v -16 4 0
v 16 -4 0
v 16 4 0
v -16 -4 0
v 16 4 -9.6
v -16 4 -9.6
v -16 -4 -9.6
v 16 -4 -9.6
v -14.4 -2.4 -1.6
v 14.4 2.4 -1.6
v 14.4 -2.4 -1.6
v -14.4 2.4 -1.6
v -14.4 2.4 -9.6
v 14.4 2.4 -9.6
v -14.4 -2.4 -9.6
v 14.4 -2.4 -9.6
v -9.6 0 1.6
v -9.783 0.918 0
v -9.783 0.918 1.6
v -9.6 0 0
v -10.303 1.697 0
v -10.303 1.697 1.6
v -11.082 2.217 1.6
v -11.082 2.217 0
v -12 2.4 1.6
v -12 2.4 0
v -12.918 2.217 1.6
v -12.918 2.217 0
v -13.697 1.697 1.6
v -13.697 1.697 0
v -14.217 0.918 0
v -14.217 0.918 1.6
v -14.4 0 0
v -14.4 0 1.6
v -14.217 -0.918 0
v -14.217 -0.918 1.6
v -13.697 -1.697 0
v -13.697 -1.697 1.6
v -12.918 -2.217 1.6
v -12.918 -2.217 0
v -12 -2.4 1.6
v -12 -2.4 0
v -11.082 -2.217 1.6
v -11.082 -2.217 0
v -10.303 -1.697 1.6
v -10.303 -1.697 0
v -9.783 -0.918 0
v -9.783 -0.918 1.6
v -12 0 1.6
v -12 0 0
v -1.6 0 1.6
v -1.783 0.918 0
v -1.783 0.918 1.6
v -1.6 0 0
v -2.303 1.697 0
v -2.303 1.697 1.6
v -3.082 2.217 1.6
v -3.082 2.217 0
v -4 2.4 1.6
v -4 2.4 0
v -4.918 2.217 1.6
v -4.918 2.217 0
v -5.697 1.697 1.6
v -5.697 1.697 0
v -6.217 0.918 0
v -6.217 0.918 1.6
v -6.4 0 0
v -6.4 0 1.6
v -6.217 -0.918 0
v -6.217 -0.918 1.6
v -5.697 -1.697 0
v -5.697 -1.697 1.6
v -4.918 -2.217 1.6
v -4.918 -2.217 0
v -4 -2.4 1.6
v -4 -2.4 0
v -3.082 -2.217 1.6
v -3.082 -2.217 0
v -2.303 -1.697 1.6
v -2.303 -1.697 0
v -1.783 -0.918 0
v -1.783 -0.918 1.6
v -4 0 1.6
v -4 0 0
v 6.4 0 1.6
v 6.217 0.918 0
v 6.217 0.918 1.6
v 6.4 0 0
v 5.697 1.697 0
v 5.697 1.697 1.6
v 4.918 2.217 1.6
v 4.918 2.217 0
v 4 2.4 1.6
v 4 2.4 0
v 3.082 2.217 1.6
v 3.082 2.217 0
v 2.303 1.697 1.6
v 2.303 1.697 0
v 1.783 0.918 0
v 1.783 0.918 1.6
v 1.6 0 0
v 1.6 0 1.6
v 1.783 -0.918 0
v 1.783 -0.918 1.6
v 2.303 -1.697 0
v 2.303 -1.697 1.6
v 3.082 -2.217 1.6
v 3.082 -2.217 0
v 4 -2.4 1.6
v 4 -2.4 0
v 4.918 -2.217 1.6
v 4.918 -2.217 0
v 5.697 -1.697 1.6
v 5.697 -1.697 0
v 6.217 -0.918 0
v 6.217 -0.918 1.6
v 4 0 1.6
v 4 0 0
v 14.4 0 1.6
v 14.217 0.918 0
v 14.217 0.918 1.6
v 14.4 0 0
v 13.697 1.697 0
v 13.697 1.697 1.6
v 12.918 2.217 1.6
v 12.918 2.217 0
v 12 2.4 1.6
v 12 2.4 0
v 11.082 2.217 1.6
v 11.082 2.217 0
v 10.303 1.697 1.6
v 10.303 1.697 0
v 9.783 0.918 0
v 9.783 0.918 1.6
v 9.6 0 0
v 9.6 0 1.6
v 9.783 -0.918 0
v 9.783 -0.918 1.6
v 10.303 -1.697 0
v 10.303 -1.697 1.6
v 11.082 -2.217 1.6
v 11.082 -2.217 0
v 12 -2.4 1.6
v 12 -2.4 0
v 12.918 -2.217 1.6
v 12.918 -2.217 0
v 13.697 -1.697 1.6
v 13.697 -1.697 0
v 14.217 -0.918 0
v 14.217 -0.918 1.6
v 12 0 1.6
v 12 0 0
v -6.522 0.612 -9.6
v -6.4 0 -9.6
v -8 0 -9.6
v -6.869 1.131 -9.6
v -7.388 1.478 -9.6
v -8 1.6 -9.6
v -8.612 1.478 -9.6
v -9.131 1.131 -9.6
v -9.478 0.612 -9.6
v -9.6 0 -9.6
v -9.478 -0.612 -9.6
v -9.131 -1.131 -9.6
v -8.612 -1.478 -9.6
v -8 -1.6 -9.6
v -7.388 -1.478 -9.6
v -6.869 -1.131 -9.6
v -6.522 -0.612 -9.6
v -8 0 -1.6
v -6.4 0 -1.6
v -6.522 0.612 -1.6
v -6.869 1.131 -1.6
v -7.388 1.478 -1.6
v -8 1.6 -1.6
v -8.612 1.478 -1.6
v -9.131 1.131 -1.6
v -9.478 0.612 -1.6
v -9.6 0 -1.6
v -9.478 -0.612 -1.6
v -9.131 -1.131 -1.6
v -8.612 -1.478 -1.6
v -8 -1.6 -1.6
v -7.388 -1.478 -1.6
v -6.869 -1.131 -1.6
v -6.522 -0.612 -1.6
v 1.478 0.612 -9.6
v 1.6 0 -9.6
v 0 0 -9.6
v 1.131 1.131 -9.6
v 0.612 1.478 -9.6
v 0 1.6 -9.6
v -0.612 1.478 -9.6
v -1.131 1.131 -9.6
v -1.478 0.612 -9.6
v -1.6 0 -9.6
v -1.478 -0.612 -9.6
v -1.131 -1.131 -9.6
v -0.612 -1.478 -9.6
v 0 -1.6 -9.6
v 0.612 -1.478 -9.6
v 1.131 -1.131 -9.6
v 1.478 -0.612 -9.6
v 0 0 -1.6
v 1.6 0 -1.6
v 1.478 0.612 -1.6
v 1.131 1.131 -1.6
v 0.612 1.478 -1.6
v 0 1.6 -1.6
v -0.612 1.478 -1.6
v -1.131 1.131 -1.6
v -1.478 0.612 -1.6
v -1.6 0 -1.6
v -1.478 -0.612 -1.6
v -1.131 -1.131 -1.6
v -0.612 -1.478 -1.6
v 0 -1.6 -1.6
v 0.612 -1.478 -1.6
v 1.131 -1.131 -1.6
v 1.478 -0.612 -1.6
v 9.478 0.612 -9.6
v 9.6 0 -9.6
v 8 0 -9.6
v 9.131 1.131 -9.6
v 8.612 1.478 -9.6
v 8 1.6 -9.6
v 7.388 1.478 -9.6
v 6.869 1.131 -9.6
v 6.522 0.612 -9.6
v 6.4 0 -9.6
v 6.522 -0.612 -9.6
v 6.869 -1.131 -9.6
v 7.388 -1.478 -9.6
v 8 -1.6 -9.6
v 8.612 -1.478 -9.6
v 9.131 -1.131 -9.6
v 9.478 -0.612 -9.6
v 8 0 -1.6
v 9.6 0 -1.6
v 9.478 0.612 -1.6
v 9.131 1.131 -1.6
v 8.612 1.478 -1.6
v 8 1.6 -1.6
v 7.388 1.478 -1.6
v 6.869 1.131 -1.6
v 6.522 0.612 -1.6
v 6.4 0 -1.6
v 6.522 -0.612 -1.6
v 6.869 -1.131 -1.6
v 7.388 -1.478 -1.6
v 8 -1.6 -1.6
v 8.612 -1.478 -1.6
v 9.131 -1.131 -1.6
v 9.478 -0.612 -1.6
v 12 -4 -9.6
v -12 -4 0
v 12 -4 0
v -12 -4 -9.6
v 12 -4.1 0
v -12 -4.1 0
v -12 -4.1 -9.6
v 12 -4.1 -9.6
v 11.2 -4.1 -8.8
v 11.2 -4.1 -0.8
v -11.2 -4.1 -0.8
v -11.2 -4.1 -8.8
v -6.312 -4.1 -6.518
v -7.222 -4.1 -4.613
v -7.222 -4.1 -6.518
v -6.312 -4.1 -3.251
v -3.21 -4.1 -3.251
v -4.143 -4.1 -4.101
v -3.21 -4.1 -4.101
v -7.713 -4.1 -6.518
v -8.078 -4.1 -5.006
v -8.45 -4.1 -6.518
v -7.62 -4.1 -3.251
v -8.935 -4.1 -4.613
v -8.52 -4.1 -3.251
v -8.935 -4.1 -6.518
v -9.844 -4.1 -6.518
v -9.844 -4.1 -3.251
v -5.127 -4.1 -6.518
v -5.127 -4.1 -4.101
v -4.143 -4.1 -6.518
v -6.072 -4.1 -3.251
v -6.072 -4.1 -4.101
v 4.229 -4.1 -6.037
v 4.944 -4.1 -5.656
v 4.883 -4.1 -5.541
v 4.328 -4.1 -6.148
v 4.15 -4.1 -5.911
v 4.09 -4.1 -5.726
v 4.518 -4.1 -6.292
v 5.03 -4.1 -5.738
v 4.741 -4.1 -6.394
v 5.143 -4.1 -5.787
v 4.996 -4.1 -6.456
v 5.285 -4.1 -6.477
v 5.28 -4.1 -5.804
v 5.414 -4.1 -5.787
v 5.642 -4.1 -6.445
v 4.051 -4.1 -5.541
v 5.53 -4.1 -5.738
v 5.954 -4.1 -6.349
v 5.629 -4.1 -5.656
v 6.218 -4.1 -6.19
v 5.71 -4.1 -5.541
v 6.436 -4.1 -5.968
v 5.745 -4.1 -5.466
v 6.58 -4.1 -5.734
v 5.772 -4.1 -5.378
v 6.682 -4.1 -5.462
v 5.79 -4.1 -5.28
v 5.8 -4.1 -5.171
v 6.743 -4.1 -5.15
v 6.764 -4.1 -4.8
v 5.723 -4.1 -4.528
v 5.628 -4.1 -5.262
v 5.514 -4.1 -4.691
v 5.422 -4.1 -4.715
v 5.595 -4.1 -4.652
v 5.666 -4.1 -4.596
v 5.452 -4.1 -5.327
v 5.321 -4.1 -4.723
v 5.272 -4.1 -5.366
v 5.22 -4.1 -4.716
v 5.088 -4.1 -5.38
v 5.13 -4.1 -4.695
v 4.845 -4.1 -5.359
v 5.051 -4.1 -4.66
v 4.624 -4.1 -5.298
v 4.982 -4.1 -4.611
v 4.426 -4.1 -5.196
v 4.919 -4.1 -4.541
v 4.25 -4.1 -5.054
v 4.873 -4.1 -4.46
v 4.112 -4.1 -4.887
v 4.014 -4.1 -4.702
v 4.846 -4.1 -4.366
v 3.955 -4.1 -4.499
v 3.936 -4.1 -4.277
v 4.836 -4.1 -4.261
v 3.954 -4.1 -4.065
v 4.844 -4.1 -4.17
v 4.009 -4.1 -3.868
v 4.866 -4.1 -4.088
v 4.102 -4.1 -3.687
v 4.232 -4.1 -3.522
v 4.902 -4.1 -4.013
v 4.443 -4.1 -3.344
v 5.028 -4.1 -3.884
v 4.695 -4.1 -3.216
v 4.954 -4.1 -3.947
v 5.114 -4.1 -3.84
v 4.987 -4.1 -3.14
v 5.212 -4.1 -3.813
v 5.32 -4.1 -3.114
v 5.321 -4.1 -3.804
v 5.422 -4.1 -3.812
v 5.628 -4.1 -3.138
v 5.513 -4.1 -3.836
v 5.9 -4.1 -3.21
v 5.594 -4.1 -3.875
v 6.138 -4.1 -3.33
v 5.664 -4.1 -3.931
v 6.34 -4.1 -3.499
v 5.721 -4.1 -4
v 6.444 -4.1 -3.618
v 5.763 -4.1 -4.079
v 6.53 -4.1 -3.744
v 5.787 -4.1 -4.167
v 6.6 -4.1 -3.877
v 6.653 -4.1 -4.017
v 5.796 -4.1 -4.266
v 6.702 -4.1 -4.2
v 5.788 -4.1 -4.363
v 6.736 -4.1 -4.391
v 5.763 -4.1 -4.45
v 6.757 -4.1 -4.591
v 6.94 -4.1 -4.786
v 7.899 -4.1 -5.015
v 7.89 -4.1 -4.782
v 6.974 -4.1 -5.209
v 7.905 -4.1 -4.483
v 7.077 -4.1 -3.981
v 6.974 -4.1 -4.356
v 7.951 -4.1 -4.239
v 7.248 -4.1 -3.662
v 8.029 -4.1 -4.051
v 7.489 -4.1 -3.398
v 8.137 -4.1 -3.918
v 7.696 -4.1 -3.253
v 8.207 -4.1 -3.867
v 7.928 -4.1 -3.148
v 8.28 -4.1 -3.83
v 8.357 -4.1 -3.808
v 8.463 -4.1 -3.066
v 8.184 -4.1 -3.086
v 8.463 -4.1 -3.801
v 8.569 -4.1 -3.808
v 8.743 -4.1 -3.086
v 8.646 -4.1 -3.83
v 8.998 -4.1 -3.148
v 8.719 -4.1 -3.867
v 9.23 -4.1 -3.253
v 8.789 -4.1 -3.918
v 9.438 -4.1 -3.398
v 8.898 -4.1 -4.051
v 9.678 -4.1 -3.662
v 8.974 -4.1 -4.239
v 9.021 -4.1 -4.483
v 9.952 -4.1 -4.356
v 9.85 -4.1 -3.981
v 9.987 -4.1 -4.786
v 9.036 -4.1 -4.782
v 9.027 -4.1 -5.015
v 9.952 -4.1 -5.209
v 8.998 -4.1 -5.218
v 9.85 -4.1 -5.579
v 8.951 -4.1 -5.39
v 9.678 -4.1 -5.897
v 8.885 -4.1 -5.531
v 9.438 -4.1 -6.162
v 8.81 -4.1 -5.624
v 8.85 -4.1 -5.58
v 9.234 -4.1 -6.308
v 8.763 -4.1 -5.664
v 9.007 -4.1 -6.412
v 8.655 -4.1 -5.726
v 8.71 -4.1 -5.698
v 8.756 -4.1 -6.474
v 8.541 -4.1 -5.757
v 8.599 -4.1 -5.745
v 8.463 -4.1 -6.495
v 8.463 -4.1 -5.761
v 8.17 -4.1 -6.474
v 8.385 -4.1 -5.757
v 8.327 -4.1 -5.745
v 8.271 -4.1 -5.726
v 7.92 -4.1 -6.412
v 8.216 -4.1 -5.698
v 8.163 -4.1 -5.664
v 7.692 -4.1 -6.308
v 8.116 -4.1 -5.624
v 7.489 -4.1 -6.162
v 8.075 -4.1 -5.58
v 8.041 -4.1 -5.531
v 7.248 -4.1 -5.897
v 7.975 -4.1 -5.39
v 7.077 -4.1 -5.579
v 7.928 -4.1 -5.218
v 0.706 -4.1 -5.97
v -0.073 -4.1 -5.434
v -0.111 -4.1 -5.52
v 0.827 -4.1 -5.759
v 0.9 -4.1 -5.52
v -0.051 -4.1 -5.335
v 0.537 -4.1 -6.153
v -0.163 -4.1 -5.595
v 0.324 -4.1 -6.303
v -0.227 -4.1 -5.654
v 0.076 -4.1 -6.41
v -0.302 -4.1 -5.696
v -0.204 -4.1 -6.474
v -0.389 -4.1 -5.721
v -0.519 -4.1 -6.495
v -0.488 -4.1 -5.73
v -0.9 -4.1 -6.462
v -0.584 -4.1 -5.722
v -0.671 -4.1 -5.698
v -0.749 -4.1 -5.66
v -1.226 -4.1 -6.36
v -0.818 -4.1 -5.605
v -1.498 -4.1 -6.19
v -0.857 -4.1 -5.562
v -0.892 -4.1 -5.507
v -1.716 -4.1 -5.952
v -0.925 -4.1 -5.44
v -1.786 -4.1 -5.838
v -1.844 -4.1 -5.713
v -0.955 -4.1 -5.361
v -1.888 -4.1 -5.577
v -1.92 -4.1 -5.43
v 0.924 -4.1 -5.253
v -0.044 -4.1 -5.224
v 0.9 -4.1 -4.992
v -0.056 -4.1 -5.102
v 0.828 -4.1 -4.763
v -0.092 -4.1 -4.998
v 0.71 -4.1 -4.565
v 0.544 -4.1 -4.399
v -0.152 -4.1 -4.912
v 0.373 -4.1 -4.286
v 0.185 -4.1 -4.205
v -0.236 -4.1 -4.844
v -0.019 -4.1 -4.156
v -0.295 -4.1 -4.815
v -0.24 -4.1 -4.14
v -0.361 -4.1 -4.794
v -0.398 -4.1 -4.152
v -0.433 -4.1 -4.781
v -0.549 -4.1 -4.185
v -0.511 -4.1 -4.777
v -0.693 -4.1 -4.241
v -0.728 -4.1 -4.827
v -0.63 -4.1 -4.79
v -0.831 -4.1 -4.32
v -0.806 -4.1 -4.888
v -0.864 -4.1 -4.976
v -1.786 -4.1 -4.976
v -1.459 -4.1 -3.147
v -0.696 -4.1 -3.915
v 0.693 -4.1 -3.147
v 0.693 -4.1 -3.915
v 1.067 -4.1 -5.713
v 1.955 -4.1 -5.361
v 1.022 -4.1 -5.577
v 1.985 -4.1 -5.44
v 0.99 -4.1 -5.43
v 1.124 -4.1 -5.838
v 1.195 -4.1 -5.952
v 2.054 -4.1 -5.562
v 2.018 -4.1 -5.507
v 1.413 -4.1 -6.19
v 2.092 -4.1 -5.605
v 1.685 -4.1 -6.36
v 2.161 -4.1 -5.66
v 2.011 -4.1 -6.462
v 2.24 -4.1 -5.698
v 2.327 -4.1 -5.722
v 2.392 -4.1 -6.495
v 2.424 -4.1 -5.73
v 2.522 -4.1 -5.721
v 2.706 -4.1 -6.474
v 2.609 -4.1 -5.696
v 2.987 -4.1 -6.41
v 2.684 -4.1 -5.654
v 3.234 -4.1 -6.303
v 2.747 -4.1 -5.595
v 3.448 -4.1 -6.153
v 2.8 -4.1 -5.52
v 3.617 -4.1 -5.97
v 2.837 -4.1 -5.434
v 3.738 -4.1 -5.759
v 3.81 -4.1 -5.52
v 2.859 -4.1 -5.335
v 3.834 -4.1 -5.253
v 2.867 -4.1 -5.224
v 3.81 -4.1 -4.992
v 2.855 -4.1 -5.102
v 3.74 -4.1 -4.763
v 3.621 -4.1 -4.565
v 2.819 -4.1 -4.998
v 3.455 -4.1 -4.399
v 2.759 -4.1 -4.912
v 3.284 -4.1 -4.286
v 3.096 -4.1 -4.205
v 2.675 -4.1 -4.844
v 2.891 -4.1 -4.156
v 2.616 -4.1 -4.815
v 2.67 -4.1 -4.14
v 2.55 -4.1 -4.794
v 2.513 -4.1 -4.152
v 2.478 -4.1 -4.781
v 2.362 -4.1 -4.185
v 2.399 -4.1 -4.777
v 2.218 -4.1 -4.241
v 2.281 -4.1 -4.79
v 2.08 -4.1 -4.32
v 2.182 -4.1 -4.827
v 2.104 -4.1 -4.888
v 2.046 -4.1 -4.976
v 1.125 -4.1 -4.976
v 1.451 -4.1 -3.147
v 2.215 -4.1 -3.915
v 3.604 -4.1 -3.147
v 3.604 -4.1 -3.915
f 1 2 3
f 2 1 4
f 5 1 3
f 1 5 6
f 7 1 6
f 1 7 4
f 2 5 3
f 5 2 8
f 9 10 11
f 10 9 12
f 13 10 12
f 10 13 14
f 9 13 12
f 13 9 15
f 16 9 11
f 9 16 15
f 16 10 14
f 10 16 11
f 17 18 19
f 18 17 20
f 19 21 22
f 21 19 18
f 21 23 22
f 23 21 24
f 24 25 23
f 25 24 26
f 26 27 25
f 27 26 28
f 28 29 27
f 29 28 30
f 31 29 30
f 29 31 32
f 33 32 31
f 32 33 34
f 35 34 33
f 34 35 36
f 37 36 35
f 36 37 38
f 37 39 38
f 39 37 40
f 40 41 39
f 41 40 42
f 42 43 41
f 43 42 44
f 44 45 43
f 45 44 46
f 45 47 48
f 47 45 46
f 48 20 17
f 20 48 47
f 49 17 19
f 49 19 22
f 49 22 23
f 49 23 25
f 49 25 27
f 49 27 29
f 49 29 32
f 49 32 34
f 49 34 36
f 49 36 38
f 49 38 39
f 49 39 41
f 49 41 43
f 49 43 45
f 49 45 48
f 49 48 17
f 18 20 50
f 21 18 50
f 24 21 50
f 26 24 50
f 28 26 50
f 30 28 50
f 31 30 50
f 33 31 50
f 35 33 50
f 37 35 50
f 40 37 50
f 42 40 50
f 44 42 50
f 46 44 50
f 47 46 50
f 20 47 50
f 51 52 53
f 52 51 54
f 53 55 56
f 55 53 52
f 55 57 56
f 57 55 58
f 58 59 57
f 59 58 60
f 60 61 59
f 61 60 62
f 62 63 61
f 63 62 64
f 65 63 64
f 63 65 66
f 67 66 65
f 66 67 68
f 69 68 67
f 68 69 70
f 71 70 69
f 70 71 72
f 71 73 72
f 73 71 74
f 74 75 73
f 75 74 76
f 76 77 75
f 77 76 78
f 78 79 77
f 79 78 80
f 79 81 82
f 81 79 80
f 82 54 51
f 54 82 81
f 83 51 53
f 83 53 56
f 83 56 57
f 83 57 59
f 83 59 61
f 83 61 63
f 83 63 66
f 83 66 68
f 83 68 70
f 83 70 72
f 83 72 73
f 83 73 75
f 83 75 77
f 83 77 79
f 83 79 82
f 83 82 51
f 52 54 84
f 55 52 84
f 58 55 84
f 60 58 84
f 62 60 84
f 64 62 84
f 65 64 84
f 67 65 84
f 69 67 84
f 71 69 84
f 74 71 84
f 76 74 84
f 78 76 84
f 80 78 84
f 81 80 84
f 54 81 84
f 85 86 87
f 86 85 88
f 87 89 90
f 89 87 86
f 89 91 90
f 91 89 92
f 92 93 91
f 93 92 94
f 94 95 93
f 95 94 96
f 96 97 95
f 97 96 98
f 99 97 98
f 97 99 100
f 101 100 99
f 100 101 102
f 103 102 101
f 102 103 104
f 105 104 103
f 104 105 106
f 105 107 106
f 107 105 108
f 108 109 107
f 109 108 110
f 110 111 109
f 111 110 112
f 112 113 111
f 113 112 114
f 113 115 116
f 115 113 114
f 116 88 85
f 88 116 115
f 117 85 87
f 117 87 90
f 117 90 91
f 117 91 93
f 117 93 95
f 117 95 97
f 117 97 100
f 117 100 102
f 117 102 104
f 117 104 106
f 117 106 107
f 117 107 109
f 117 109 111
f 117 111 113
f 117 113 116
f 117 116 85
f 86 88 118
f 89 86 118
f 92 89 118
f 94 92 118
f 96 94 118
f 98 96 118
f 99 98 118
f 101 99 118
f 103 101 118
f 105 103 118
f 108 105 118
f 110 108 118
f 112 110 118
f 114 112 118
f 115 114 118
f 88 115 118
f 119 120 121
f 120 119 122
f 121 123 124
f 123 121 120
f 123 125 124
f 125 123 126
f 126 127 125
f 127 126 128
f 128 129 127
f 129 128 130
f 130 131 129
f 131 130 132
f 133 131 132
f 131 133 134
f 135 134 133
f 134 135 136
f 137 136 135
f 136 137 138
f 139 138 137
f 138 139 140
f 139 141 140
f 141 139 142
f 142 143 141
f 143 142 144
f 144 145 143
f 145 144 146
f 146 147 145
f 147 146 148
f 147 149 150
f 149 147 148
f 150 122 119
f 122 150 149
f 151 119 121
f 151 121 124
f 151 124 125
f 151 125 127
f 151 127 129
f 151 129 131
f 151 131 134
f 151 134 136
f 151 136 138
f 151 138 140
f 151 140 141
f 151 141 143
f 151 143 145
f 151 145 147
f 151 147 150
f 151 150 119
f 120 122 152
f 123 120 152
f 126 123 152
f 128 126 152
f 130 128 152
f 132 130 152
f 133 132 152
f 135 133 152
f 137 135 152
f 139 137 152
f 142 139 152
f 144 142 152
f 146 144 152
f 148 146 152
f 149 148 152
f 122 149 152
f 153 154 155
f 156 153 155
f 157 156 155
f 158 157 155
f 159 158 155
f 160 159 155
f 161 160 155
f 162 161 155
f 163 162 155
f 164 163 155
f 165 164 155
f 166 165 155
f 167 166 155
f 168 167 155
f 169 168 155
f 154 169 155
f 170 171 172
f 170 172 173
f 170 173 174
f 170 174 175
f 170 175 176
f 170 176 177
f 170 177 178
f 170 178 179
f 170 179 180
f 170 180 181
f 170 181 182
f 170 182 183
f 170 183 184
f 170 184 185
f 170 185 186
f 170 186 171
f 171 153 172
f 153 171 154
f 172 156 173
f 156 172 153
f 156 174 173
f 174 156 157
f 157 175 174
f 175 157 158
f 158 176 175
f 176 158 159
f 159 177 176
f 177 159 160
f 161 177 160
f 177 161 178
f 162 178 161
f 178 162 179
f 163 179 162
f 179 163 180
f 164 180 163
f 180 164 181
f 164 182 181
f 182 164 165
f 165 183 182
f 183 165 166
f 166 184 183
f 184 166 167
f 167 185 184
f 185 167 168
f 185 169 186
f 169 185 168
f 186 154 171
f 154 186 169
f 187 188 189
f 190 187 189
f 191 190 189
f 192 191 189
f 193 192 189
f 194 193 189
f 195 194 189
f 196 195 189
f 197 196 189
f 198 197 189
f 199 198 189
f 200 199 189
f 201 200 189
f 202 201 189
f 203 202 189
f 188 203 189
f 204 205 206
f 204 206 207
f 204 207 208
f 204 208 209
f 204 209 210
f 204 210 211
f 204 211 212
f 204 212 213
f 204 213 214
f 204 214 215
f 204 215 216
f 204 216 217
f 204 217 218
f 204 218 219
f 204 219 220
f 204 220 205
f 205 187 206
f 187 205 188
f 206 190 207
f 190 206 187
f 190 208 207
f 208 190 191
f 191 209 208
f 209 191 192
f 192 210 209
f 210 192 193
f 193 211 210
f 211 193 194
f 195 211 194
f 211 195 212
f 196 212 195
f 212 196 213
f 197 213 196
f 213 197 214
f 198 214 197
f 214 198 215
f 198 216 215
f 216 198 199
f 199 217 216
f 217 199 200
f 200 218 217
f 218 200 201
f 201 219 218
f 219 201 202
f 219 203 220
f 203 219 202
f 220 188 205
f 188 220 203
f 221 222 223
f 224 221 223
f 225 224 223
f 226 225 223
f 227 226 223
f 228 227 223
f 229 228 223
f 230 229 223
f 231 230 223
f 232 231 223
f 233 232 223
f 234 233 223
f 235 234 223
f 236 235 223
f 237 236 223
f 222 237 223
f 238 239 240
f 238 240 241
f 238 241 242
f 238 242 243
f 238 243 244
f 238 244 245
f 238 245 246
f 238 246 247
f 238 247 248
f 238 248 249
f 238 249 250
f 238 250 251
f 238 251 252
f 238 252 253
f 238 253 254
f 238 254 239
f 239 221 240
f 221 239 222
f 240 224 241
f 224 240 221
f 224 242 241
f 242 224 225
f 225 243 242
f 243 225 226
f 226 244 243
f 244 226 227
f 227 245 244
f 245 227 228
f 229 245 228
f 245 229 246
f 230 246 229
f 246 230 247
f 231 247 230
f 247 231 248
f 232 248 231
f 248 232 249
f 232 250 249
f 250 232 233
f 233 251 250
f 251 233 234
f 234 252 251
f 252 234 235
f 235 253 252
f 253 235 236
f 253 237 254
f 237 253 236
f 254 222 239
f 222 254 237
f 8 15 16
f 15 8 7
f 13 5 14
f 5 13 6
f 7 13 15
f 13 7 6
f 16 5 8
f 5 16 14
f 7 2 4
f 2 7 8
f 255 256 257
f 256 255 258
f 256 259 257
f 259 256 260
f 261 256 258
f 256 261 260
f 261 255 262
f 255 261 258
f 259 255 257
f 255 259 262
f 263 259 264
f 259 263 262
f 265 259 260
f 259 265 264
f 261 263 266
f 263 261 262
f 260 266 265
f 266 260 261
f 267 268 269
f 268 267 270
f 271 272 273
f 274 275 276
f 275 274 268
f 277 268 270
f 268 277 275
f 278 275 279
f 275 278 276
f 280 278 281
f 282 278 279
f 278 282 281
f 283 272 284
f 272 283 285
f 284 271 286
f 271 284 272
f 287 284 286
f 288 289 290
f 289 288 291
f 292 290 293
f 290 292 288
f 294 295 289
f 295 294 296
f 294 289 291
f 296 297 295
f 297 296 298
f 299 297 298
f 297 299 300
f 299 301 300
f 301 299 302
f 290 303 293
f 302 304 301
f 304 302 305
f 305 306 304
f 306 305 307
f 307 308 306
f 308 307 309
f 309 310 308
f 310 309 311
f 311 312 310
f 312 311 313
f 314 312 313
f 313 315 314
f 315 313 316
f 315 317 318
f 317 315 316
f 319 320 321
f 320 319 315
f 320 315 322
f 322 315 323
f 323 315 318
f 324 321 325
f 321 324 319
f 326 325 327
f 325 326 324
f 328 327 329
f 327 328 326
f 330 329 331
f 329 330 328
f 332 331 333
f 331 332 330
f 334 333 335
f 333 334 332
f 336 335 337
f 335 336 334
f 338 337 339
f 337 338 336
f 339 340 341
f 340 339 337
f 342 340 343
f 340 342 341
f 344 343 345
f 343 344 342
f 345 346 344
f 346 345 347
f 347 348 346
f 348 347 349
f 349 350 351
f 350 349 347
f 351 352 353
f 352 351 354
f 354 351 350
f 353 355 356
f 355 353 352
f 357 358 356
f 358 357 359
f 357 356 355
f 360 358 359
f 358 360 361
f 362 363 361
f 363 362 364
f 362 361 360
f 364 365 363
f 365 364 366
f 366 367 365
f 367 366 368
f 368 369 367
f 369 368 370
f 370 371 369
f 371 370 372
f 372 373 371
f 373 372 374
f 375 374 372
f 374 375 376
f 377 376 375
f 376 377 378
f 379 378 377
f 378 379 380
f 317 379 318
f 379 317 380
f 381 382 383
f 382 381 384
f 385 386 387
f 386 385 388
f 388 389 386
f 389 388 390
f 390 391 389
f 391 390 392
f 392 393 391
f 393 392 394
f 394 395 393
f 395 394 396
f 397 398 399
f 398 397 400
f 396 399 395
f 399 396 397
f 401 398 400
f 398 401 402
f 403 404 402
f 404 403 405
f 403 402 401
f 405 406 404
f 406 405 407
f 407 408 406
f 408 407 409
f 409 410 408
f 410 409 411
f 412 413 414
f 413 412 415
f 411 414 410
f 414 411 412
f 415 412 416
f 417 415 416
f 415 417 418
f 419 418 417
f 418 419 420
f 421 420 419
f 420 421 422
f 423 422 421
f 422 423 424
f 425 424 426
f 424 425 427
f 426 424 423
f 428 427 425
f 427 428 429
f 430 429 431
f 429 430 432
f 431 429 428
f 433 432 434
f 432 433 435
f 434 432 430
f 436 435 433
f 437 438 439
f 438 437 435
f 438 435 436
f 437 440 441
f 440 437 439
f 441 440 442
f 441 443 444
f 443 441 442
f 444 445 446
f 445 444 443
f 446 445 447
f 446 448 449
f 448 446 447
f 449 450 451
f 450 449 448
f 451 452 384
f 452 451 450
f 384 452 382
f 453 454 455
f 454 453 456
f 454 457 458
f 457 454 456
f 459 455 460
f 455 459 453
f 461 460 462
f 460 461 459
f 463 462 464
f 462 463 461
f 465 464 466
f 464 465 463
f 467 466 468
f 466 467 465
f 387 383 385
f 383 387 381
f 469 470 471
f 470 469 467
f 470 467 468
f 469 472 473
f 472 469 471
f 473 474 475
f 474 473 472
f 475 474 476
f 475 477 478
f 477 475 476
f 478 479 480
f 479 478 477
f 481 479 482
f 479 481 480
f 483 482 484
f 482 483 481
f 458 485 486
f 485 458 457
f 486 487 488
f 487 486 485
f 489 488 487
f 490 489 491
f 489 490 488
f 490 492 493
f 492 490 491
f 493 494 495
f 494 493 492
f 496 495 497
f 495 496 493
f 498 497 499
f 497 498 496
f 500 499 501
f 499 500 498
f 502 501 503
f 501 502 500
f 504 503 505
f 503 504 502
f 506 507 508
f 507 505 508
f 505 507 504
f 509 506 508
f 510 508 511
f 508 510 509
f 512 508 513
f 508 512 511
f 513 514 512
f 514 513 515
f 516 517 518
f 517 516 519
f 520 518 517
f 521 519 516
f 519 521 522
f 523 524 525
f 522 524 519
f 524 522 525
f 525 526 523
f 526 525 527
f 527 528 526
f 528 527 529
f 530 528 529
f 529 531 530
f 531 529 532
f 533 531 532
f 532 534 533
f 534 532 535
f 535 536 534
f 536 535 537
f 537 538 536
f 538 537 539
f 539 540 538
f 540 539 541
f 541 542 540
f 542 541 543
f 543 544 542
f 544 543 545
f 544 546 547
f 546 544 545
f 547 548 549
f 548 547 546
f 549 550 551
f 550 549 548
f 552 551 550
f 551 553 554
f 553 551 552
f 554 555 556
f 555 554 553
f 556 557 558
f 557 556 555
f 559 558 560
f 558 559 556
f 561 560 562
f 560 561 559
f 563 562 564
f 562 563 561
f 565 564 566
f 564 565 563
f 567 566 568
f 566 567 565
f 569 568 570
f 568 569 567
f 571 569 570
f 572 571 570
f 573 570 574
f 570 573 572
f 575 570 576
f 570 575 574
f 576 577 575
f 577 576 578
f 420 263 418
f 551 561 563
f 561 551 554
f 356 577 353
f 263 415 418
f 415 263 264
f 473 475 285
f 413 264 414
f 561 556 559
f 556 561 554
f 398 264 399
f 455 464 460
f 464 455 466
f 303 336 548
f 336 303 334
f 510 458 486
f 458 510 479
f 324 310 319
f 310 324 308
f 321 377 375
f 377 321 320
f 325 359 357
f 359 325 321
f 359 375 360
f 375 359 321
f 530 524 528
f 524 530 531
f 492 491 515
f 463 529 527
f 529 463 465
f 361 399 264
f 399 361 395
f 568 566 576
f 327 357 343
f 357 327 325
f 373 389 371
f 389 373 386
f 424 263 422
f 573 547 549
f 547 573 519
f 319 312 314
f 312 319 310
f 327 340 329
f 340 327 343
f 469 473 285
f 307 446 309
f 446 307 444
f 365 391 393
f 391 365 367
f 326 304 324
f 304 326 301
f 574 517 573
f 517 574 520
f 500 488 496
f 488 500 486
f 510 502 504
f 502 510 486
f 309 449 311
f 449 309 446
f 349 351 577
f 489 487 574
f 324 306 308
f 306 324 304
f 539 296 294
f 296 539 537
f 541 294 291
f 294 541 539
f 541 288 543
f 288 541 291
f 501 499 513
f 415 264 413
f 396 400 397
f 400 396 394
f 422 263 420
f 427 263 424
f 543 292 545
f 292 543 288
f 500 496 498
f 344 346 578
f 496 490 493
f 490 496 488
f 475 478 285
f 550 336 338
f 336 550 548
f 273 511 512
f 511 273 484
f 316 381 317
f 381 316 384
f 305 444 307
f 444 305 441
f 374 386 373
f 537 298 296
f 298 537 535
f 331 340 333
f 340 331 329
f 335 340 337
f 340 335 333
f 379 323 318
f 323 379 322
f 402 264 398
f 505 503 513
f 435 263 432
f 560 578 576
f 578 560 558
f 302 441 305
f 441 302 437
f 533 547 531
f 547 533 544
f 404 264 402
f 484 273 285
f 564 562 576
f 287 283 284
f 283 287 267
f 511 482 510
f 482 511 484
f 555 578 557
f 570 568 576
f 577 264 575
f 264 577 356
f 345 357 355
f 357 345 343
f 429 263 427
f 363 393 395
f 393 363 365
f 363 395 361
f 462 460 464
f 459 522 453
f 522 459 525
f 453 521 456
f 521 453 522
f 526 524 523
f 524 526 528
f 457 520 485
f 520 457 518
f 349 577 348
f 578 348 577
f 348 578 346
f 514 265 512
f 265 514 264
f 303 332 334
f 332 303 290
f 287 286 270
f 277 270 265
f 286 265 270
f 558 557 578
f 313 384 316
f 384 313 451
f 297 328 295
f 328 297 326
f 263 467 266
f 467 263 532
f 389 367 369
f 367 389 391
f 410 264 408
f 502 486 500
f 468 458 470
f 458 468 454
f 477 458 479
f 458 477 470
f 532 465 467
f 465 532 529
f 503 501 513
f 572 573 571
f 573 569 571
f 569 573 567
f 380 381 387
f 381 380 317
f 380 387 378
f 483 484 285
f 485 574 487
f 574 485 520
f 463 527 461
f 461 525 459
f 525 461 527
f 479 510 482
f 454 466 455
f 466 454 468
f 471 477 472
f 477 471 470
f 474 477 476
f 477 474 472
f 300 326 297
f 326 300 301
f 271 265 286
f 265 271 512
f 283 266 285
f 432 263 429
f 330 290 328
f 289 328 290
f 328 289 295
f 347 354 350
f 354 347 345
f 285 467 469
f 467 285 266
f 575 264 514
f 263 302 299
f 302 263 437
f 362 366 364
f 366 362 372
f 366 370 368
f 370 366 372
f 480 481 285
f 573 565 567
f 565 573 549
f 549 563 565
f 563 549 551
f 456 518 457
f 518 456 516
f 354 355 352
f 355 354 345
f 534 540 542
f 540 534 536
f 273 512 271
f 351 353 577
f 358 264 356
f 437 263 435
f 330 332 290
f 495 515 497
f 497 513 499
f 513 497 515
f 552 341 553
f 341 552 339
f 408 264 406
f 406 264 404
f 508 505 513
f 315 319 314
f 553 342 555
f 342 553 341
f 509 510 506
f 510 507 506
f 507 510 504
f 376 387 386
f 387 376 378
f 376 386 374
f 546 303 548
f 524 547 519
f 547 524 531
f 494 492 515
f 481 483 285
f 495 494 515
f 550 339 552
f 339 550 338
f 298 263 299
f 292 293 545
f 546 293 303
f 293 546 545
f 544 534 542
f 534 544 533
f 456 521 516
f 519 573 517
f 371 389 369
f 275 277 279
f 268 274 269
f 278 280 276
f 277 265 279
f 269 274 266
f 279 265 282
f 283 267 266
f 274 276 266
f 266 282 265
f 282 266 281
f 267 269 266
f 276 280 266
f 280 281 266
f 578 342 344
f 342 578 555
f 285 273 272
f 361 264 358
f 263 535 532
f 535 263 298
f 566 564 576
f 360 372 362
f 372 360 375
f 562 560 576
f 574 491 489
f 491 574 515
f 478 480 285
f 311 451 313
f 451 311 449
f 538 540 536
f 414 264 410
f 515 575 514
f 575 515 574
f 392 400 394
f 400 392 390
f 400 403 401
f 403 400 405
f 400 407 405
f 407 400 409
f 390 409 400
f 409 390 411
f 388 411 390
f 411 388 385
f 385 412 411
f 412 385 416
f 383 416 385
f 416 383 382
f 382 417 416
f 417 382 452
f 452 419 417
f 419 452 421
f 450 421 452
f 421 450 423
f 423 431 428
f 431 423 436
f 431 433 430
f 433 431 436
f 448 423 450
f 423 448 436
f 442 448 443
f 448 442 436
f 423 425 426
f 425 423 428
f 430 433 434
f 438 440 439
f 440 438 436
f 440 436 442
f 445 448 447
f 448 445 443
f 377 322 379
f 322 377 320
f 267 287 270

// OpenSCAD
use <../lib.scad>
use <193445d.scad>
use <3010.scad>
function ldraw_lib__3010d0l() = [
// 0 Brick  1 x  4 with License Plate "MT 5590" Sticker
// 0 Name: 3010d0l.dat
// 0 Author: Takeshi Takahashi [RainbowDolphin]
// 0 !LDRAW_ORG Shortcut UPDATE 2024-07
// 0 !LICENSE Licensed under CC BY 4.0 : see CAreadme.txt
// 
// 0 BFC CERTIFY CCW
  [0,"BFC","CERTIFY"],
  [0,"BFC","CCW"],
// 
// 0 !CATEGORY Sticker Shortcut
// 0 !KEYWORDS Bricklink 3010pb058, Model Team, Set 5590, truck
// 
// 0 !HISTORY 2024-08-26 [OrionP] Official Update 2024-07
// 
// 1 16 0 0 0 1 0 0 0 1 0 0 0 1 3010.dat
  [1,16,0,0,0,1,0,0,0,1,0,0,0,1, ldraw_lib__3010()],
// 1 16 0 12 -10 1 0 0 0 0 -1 0 1 0 193445d.dat
  [1,16,0,12,-10,1,0,0,0,0,-1,0,1,0, ldraw_lib__193445d()],
];
module ldraw_lib__3010d0l(step=0, col=false, unit=2/5, alt=false, line=0.2, solid=!$preview)
    makepoly(ldraw_lib__3010d0l(), step=step, col=col, unit=unit, alt=alt, line=line, solid=solid);
ldraw_lib__3010d0l(line=0.2);
